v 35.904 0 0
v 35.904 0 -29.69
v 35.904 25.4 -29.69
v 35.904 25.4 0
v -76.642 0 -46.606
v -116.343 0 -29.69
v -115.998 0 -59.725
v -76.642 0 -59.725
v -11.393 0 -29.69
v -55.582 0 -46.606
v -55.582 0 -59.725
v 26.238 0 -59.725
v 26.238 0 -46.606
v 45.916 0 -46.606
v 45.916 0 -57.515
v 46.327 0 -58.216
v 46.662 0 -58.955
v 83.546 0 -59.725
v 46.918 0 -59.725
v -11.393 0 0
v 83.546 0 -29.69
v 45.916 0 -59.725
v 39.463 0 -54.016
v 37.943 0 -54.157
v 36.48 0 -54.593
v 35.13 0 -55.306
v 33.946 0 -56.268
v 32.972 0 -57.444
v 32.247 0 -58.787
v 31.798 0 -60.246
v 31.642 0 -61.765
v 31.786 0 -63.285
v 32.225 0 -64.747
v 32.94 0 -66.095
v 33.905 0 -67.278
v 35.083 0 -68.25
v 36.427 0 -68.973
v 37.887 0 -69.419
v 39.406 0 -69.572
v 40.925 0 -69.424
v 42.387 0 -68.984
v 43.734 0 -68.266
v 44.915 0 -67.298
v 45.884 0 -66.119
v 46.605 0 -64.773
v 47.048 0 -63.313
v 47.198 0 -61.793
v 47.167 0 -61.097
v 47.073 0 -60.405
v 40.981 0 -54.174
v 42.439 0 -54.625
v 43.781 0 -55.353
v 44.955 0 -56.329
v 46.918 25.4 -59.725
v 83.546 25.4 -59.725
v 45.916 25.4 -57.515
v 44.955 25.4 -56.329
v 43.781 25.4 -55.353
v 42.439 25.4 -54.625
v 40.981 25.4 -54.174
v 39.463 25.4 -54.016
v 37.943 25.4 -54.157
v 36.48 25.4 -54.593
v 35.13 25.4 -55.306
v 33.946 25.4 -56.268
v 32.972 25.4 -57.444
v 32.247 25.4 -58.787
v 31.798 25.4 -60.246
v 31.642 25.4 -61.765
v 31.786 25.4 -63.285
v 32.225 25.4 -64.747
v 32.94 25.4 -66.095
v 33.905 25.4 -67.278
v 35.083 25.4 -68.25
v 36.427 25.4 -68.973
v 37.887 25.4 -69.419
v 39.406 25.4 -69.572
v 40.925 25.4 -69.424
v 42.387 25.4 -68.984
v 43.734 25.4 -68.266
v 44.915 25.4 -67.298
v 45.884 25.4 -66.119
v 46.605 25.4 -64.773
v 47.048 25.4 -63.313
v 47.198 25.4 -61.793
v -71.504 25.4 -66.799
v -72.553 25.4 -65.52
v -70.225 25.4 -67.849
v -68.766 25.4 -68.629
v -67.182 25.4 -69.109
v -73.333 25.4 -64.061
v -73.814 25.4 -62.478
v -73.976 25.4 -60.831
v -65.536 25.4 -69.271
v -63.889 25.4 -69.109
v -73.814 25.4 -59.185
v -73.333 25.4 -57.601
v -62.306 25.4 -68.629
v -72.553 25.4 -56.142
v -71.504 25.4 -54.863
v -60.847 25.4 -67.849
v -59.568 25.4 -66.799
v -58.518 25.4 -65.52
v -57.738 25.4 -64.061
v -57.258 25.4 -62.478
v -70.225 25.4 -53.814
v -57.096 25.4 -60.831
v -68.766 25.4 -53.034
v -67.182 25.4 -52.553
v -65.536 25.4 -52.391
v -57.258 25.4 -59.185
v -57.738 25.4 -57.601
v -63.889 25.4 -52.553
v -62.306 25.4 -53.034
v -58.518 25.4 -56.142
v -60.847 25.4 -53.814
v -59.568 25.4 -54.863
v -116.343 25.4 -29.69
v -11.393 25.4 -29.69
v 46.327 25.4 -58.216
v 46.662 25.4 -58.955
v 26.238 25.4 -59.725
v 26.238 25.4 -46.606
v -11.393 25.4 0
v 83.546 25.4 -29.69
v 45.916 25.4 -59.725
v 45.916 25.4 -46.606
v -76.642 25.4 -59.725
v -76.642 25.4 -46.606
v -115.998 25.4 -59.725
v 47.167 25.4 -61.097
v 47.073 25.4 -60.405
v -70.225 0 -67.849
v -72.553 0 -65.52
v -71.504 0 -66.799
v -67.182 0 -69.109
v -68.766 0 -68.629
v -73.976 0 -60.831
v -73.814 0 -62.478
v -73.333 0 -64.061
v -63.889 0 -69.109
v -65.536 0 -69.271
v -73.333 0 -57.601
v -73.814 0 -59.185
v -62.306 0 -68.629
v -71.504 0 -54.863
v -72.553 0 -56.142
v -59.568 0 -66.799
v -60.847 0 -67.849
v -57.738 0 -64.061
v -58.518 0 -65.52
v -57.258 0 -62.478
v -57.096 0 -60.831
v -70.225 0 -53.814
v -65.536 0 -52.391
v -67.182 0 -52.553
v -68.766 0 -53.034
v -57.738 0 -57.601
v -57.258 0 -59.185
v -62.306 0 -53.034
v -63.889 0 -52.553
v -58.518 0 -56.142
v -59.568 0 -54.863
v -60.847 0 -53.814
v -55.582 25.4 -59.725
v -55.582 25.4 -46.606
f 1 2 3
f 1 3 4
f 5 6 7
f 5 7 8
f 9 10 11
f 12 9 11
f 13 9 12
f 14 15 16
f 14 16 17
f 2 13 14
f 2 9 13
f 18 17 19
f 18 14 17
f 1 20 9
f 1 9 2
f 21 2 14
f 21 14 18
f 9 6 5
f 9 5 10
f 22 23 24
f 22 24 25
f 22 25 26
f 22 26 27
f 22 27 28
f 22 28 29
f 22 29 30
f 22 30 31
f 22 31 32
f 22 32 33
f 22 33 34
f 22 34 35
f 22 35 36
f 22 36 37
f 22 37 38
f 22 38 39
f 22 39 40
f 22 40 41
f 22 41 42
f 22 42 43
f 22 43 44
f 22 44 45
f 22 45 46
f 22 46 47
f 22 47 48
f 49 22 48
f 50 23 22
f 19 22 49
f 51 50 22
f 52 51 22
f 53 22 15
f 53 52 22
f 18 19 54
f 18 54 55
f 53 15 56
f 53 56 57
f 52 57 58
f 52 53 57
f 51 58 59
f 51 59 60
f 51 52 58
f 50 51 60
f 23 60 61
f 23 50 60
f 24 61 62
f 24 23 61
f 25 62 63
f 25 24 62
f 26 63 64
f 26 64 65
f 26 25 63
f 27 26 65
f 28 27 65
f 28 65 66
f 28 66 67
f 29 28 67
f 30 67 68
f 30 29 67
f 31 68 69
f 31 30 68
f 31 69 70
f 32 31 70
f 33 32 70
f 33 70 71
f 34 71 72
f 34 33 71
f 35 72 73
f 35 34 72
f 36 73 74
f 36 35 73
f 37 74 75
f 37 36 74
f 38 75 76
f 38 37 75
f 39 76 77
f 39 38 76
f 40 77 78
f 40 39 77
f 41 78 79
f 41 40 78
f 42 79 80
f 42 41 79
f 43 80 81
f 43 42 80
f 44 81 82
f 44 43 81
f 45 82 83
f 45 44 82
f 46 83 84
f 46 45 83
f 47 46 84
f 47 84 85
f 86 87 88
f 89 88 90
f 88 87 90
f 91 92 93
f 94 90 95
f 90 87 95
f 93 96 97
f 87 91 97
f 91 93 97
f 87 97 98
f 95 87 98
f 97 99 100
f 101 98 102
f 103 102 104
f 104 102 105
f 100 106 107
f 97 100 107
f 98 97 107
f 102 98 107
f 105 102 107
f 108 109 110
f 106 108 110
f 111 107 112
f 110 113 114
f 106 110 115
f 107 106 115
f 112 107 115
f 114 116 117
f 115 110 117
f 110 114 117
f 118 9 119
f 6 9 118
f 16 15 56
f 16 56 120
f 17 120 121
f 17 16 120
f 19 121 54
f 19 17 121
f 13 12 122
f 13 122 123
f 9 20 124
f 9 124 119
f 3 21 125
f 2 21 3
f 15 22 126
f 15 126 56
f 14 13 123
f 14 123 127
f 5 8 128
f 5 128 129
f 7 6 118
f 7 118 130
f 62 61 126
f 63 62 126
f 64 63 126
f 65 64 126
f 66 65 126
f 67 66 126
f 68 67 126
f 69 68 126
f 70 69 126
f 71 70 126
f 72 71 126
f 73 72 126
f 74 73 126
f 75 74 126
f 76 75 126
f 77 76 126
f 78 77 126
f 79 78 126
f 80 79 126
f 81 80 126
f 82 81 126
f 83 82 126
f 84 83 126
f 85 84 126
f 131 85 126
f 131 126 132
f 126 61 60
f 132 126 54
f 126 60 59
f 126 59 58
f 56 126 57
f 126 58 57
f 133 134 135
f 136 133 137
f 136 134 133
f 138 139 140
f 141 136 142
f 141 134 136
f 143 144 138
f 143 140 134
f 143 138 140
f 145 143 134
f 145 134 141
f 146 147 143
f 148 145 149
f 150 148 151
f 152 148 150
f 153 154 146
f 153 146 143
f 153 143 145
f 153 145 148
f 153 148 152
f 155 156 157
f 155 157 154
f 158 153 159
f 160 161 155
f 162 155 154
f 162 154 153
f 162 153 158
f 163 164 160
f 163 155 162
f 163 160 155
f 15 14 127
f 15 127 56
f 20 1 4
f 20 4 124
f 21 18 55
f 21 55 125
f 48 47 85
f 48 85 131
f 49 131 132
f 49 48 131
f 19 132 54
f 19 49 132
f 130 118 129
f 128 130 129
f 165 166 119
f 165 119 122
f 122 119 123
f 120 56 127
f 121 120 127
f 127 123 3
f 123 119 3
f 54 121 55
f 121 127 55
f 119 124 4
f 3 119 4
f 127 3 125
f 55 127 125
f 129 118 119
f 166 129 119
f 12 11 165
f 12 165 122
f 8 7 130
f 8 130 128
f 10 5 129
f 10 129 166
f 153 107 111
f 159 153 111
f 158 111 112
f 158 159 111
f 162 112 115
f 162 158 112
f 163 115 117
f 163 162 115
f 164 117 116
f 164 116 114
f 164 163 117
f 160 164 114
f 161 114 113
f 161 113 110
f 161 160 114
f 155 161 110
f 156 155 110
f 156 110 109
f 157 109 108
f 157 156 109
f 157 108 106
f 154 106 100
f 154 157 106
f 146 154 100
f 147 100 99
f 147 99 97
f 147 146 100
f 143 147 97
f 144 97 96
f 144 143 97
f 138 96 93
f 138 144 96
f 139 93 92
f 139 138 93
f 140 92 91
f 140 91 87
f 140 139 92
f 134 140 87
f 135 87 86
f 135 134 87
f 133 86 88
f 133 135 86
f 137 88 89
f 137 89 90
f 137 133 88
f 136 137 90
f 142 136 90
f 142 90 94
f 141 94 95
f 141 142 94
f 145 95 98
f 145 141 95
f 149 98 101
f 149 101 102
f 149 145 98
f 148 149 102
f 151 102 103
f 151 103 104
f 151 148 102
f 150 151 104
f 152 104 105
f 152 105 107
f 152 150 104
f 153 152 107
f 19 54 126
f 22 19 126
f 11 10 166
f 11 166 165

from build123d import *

# Parameters (mm, degrees)
F0_R     = 8.440014
F1_DEPTH = 25.4


with BuildPart() as f1:
    # F0 (on Front) → F1 (new body)
    with BuildSketch(Plane.XZ):
        with BuildLine():
            Line((-116.343424, -29.69001), (-115.998186, -59.725258))
            Line((-115.998186, -59.725258), (-76.641664, -59.725258))
            Line((-76.641664, -59.725258), (-76.641664, -46.606414))
            Line((-76.641664, -46.606414), (-55.582467, -46.606414))
            Line((-55.582467, -46.606414), (-55.582467, -59.725258))
            Line((-55.582467, -59.725258), (26.237682, -59.725258))
            Line((26.237682, -59.725258), (26.237682, -46.606414))
            Line((26.237682, -46.606414), (45.91595, -46.606414))
            Line((45.91595, -46.606414), (45.91595, -57.515192))
            ThreePointArc((45.91595, -57.515192), (46.503827, -58.580895), (46.918259, -59.725258))
            Line((46.918259, -59.725258), (83.546318, -59.725258))
            Line((83.546318, -59.725258), (83.546318, -29.69001))
            Line((83.546318, -29.69001), (35.904203, -29.69001))
            Line((35.904203, -29.69001), (35.904203, 0))
            Line((35.904203, 0), (-11.392683, 0))
            Line((-11.392683, 0), (-11.392683, -29.69001))
            Line((-11.392683, -29.69001), (-116.343424, -29.69001))
        make_face()
        with BuildLine():
            Line((45.91595, -59.725258), (45.91595, -57.515192))
            ThreePointArc((45.91595, -57.515192), (31.969619, -64.02661), (47.198268, -61.793457))
            ThreePointArc((47.198268, -61.793457), (47.127948, -60.749923), (46.918259, -59.725258))
            Line((46.918259, -59.725258), (45.91595, -59.725258))
        make_face()
        with Locations((-65.535746, -60.831124)):
            Circle(F0_R)
    extrude(amount=-F1_DEPTH)


solid = f1.part
